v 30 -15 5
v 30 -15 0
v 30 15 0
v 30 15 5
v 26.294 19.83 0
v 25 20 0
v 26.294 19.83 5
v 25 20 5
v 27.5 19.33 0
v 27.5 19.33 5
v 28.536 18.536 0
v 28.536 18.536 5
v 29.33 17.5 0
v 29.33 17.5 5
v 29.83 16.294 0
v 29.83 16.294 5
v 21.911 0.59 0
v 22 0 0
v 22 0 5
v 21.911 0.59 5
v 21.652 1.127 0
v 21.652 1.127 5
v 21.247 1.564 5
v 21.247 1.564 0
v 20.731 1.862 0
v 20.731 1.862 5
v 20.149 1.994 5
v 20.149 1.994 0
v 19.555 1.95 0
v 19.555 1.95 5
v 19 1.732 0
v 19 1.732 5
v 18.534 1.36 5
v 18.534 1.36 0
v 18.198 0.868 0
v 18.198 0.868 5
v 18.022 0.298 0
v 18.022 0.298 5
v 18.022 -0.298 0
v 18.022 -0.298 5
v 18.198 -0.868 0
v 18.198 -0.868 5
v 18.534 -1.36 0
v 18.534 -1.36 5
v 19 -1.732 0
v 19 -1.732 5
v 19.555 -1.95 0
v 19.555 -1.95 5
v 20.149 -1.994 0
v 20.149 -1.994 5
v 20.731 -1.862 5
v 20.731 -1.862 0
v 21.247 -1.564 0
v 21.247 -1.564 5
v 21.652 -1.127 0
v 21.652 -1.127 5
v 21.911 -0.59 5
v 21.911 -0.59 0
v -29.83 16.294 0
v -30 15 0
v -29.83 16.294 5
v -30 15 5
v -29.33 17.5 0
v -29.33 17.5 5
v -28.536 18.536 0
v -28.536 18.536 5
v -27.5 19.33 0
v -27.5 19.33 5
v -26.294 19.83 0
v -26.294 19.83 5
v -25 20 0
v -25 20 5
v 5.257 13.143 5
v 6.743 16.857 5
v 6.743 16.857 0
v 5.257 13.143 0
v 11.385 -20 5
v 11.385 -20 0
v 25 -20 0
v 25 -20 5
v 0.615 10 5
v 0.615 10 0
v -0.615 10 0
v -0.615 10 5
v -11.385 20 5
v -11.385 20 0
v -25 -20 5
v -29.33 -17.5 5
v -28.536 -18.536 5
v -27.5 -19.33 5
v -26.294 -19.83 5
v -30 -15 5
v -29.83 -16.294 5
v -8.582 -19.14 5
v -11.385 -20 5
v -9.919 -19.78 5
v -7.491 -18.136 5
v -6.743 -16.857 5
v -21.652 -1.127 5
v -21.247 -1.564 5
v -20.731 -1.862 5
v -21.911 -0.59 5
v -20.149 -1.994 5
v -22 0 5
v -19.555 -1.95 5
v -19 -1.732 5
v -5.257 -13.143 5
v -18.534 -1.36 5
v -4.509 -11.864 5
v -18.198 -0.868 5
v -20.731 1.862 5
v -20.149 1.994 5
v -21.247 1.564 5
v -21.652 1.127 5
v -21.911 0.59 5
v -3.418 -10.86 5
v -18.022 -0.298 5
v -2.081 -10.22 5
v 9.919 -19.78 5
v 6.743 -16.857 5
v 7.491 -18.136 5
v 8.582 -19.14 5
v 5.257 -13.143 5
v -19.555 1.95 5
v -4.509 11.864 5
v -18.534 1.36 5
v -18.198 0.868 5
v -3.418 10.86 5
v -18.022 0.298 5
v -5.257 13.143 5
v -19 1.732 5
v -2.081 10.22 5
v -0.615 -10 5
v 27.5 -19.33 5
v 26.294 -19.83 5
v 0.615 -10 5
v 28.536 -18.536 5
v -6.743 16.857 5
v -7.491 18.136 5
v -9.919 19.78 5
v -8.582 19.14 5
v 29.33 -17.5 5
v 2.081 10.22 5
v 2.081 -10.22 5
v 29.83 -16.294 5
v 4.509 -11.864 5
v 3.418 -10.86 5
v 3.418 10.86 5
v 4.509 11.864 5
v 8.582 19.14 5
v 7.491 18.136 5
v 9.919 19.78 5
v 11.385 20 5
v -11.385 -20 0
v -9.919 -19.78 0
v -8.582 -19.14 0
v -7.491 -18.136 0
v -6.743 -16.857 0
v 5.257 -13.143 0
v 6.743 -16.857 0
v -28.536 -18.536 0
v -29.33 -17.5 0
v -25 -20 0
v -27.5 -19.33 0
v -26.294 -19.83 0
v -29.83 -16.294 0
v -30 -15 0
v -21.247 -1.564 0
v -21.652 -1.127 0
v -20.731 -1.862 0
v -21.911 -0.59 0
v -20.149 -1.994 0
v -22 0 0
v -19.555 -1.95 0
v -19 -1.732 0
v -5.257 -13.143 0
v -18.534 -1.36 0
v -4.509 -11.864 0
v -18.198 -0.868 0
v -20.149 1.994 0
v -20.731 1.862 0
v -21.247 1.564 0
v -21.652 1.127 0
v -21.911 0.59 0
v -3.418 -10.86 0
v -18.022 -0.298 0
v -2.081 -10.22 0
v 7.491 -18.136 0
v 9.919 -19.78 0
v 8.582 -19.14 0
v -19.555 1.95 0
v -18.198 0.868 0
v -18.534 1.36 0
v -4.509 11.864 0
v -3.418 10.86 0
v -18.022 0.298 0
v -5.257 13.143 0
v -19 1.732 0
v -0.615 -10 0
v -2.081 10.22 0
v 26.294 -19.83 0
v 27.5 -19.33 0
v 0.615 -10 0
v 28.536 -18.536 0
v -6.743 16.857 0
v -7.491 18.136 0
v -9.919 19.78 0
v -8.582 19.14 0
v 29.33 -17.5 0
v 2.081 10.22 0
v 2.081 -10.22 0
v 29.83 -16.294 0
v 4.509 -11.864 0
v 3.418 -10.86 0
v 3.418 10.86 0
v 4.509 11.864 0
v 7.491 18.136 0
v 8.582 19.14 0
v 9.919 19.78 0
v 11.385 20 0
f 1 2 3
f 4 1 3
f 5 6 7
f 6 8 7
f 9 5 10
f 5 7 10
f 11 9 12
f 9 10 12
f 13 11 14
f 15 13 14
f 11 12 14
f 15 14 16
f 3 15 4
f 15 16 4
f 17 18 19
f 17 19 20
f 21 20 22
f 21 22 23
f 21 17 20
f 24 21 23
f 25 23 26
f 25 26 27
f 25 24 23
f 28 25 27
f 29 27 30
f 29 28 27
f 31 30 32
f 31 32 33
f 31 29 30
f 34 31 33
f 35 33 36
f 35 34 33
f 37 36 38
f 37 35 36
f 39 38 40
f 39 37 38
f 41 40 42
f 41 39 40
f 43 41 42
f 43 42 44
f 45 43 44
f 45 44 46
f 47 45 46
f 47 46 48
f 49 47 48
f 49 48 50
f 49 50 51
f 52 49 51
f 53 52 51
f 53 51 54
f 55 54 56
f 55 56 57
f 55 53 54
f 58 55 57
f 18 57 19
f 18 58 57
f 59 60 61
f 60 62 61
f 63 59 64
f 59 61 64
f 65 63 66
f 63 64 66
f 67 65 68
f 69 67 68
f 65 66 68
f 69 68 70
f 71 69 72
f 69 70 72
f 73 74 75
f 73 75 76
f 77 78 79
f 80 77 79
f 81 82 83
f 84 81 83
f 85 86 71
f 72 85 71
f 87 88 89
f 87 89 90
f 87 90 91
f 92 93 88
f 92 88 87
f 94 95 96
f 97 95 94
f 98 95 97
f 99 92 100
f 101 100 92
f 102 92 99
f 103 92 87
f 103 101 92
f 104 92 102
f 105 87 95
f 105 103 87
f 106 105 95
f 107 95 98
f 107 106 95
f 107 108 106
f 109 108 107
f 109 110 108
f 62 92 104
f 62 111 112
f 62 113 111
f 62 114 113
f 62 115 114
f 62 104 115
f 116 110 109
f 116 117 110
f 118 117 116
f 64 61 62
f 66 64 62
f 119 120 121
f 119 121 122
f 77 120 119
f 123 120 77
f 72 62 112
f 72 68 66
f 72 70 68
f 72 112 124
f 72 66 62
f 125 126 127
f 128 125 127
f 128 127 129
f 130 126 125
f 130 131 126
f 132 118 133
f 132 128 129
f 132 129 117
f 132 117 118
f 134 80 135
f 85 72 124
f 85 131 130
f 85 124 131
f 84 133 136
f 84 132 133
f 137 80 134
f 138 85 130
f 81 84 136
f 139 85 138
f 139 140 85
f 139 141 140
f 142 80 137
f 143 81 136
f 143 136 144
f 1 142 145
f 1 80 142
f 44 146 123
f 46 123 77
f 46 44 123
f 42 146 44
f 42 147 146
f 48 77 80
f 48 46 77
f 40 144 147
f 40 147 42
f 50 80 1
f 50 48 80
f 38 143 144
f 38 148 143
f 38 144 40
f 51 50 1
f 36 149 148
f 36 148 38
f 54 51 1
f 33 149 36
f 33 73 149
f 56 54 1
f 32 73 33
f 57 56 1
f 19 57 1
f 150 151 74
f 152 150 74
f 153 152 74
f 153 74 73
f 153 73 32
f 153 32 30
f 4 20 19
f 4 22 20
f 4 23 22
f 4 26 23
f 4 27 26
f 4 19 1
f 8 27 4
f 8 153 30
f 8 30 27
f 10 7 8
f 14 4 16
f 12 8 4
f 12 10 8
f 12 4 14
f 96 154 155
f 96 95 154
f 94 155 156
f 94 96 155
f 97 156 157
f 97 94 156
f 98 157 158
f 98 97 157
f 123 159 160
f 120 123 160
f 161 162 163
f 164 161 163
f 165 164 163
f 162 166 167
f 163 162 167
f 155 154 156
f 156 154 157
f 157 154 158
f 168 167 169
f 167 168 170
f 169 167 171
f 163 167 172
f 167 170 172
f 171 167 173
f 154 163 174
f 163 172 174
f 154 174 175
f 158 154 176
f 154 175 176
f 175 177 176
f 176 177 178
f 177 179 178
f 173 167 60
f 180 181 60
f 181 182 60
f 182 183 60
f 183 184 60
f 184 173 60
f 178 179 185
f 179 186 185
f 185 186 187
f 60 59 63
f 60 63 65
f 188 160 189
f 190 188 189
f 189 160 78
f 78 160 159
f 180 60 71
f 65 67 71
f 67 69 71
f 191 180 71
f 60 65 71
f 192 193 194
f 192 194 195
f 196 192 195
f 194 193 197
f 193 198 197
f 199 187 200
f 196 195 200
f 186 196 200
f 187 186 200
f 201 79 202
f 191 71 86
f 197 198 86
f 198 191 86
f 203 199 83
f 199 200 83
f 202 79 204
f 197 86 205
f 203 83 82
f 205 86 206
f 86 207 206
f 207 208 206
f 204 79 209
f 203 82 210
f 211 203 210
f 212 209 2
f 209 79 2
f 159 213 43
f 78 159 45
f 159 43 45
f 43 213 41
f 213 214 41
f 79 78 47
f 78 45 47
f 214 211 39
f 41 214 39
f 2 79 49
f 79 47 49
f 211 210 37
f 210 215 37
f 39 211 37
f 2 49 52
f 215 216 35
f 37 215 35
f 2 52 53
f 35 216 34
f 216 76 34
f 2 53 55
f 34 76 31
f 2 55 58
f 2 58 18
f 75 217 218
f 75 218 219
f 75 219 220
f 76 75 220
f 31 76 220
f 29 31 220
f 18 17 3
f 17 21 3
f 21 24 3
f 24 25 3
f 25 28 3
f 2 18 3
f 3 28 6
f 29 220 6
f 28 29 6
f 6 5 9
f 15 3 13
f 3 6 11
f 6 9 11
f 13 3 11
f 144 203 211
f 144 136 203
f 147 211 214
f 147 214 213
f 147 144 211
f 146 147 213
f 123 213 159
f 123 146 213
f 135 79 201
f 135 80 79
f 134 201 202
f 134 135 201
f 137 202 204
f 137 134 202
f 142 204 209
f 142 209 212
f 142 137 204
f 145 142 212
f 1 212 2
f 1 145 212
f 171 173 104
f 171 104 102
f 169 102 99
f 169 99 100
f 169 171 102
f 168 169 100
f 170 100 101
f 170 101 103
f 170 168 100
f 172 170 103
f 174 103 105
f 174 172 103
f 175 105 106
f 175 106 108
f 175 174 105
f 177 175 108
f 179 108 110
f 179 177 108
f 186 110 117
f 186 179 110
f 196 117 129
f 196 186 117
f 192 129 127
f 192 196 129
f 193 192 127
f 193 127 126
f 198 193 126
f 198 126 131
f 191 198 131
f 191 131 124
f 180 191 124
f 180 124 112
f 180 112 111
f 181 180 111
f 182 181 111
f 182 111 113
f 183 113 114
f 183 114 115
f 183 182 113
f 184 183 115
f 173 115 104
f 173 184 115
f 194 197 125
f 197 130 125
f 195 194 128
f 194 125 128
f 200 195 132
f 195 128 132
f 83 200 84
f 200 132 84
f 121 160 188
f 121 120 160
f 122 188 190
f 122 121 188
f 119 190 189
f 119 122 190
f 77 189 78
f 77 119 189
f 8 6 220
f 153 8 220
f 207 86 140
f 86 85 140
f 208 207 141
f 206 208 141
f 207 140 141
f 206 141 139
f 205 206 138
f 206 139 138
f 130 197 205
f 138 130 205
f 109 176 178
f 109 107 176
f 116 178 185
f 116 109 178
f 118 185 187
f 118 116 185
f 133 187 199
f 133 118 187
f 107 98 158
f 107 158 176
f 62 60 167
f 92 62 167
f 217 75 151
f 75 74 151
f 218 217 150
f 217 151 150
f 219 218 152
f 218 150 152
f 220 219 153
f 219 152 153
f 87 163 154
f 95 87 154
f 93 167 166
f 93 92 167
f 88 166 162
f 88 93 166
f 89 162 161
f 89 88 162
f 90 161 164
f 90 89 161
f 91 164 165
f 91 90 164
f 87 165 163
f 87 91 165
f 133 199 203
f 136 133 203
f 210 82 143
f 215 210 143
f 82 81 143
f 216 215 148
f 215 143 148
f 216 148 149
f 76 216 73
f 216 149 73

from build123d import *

# Parameters (mm, degrees)
ESQUISSE1_R        = 2
BOSS_EXTRU_1_DEPTH = 5
CONG_1_R           = 5


with BuildPart() as part:
    # Esquisse1 → Boss.-Extru.1 (new body)
    with BuildSketch(Plane.XY):
        Polygon((-30, 20), (-30, -20), (-8, -20), (-4, -10), (4, -10), (8, -20), (30, -20), (30, 20), (8, 20), (4, 10), (-4, 10), (-8, 20), align=None)
        with Locations((20, 0)):
            Circle(ESQUISSE1_R, mode=Mode.SUBTRACT)
        with Locations(Location((-20, 0, 0), (0, 0, 180))):
            Circle(ESQUISSE1_R, mode=Mode.SUBTRACT)
    extrude(amount=BOSS_EXTRU_1_DEPTH)

    # Congé1
    cong_1_edges = [part.edges().sort_by_distance(p)[0] for p in [
        (-8, 20, 2.5),
        (-4, 10, 2.5),
        (4, 10, 2.5),
        (8, 20, 2.5),
        (30, 20, 2.5),
        (30, -20, 2.5),
        (8, -20, 2.5),
        (4, -10, 2.5),
        (-4, -10, 2.5),
        (-8, -20, 2.5),
        (-30, -20, 2.5),
        (-30, 20, 2.5),
    ]]
    fillet(cong_1_edges, radius=CONG_1_R)


solid = part.part
